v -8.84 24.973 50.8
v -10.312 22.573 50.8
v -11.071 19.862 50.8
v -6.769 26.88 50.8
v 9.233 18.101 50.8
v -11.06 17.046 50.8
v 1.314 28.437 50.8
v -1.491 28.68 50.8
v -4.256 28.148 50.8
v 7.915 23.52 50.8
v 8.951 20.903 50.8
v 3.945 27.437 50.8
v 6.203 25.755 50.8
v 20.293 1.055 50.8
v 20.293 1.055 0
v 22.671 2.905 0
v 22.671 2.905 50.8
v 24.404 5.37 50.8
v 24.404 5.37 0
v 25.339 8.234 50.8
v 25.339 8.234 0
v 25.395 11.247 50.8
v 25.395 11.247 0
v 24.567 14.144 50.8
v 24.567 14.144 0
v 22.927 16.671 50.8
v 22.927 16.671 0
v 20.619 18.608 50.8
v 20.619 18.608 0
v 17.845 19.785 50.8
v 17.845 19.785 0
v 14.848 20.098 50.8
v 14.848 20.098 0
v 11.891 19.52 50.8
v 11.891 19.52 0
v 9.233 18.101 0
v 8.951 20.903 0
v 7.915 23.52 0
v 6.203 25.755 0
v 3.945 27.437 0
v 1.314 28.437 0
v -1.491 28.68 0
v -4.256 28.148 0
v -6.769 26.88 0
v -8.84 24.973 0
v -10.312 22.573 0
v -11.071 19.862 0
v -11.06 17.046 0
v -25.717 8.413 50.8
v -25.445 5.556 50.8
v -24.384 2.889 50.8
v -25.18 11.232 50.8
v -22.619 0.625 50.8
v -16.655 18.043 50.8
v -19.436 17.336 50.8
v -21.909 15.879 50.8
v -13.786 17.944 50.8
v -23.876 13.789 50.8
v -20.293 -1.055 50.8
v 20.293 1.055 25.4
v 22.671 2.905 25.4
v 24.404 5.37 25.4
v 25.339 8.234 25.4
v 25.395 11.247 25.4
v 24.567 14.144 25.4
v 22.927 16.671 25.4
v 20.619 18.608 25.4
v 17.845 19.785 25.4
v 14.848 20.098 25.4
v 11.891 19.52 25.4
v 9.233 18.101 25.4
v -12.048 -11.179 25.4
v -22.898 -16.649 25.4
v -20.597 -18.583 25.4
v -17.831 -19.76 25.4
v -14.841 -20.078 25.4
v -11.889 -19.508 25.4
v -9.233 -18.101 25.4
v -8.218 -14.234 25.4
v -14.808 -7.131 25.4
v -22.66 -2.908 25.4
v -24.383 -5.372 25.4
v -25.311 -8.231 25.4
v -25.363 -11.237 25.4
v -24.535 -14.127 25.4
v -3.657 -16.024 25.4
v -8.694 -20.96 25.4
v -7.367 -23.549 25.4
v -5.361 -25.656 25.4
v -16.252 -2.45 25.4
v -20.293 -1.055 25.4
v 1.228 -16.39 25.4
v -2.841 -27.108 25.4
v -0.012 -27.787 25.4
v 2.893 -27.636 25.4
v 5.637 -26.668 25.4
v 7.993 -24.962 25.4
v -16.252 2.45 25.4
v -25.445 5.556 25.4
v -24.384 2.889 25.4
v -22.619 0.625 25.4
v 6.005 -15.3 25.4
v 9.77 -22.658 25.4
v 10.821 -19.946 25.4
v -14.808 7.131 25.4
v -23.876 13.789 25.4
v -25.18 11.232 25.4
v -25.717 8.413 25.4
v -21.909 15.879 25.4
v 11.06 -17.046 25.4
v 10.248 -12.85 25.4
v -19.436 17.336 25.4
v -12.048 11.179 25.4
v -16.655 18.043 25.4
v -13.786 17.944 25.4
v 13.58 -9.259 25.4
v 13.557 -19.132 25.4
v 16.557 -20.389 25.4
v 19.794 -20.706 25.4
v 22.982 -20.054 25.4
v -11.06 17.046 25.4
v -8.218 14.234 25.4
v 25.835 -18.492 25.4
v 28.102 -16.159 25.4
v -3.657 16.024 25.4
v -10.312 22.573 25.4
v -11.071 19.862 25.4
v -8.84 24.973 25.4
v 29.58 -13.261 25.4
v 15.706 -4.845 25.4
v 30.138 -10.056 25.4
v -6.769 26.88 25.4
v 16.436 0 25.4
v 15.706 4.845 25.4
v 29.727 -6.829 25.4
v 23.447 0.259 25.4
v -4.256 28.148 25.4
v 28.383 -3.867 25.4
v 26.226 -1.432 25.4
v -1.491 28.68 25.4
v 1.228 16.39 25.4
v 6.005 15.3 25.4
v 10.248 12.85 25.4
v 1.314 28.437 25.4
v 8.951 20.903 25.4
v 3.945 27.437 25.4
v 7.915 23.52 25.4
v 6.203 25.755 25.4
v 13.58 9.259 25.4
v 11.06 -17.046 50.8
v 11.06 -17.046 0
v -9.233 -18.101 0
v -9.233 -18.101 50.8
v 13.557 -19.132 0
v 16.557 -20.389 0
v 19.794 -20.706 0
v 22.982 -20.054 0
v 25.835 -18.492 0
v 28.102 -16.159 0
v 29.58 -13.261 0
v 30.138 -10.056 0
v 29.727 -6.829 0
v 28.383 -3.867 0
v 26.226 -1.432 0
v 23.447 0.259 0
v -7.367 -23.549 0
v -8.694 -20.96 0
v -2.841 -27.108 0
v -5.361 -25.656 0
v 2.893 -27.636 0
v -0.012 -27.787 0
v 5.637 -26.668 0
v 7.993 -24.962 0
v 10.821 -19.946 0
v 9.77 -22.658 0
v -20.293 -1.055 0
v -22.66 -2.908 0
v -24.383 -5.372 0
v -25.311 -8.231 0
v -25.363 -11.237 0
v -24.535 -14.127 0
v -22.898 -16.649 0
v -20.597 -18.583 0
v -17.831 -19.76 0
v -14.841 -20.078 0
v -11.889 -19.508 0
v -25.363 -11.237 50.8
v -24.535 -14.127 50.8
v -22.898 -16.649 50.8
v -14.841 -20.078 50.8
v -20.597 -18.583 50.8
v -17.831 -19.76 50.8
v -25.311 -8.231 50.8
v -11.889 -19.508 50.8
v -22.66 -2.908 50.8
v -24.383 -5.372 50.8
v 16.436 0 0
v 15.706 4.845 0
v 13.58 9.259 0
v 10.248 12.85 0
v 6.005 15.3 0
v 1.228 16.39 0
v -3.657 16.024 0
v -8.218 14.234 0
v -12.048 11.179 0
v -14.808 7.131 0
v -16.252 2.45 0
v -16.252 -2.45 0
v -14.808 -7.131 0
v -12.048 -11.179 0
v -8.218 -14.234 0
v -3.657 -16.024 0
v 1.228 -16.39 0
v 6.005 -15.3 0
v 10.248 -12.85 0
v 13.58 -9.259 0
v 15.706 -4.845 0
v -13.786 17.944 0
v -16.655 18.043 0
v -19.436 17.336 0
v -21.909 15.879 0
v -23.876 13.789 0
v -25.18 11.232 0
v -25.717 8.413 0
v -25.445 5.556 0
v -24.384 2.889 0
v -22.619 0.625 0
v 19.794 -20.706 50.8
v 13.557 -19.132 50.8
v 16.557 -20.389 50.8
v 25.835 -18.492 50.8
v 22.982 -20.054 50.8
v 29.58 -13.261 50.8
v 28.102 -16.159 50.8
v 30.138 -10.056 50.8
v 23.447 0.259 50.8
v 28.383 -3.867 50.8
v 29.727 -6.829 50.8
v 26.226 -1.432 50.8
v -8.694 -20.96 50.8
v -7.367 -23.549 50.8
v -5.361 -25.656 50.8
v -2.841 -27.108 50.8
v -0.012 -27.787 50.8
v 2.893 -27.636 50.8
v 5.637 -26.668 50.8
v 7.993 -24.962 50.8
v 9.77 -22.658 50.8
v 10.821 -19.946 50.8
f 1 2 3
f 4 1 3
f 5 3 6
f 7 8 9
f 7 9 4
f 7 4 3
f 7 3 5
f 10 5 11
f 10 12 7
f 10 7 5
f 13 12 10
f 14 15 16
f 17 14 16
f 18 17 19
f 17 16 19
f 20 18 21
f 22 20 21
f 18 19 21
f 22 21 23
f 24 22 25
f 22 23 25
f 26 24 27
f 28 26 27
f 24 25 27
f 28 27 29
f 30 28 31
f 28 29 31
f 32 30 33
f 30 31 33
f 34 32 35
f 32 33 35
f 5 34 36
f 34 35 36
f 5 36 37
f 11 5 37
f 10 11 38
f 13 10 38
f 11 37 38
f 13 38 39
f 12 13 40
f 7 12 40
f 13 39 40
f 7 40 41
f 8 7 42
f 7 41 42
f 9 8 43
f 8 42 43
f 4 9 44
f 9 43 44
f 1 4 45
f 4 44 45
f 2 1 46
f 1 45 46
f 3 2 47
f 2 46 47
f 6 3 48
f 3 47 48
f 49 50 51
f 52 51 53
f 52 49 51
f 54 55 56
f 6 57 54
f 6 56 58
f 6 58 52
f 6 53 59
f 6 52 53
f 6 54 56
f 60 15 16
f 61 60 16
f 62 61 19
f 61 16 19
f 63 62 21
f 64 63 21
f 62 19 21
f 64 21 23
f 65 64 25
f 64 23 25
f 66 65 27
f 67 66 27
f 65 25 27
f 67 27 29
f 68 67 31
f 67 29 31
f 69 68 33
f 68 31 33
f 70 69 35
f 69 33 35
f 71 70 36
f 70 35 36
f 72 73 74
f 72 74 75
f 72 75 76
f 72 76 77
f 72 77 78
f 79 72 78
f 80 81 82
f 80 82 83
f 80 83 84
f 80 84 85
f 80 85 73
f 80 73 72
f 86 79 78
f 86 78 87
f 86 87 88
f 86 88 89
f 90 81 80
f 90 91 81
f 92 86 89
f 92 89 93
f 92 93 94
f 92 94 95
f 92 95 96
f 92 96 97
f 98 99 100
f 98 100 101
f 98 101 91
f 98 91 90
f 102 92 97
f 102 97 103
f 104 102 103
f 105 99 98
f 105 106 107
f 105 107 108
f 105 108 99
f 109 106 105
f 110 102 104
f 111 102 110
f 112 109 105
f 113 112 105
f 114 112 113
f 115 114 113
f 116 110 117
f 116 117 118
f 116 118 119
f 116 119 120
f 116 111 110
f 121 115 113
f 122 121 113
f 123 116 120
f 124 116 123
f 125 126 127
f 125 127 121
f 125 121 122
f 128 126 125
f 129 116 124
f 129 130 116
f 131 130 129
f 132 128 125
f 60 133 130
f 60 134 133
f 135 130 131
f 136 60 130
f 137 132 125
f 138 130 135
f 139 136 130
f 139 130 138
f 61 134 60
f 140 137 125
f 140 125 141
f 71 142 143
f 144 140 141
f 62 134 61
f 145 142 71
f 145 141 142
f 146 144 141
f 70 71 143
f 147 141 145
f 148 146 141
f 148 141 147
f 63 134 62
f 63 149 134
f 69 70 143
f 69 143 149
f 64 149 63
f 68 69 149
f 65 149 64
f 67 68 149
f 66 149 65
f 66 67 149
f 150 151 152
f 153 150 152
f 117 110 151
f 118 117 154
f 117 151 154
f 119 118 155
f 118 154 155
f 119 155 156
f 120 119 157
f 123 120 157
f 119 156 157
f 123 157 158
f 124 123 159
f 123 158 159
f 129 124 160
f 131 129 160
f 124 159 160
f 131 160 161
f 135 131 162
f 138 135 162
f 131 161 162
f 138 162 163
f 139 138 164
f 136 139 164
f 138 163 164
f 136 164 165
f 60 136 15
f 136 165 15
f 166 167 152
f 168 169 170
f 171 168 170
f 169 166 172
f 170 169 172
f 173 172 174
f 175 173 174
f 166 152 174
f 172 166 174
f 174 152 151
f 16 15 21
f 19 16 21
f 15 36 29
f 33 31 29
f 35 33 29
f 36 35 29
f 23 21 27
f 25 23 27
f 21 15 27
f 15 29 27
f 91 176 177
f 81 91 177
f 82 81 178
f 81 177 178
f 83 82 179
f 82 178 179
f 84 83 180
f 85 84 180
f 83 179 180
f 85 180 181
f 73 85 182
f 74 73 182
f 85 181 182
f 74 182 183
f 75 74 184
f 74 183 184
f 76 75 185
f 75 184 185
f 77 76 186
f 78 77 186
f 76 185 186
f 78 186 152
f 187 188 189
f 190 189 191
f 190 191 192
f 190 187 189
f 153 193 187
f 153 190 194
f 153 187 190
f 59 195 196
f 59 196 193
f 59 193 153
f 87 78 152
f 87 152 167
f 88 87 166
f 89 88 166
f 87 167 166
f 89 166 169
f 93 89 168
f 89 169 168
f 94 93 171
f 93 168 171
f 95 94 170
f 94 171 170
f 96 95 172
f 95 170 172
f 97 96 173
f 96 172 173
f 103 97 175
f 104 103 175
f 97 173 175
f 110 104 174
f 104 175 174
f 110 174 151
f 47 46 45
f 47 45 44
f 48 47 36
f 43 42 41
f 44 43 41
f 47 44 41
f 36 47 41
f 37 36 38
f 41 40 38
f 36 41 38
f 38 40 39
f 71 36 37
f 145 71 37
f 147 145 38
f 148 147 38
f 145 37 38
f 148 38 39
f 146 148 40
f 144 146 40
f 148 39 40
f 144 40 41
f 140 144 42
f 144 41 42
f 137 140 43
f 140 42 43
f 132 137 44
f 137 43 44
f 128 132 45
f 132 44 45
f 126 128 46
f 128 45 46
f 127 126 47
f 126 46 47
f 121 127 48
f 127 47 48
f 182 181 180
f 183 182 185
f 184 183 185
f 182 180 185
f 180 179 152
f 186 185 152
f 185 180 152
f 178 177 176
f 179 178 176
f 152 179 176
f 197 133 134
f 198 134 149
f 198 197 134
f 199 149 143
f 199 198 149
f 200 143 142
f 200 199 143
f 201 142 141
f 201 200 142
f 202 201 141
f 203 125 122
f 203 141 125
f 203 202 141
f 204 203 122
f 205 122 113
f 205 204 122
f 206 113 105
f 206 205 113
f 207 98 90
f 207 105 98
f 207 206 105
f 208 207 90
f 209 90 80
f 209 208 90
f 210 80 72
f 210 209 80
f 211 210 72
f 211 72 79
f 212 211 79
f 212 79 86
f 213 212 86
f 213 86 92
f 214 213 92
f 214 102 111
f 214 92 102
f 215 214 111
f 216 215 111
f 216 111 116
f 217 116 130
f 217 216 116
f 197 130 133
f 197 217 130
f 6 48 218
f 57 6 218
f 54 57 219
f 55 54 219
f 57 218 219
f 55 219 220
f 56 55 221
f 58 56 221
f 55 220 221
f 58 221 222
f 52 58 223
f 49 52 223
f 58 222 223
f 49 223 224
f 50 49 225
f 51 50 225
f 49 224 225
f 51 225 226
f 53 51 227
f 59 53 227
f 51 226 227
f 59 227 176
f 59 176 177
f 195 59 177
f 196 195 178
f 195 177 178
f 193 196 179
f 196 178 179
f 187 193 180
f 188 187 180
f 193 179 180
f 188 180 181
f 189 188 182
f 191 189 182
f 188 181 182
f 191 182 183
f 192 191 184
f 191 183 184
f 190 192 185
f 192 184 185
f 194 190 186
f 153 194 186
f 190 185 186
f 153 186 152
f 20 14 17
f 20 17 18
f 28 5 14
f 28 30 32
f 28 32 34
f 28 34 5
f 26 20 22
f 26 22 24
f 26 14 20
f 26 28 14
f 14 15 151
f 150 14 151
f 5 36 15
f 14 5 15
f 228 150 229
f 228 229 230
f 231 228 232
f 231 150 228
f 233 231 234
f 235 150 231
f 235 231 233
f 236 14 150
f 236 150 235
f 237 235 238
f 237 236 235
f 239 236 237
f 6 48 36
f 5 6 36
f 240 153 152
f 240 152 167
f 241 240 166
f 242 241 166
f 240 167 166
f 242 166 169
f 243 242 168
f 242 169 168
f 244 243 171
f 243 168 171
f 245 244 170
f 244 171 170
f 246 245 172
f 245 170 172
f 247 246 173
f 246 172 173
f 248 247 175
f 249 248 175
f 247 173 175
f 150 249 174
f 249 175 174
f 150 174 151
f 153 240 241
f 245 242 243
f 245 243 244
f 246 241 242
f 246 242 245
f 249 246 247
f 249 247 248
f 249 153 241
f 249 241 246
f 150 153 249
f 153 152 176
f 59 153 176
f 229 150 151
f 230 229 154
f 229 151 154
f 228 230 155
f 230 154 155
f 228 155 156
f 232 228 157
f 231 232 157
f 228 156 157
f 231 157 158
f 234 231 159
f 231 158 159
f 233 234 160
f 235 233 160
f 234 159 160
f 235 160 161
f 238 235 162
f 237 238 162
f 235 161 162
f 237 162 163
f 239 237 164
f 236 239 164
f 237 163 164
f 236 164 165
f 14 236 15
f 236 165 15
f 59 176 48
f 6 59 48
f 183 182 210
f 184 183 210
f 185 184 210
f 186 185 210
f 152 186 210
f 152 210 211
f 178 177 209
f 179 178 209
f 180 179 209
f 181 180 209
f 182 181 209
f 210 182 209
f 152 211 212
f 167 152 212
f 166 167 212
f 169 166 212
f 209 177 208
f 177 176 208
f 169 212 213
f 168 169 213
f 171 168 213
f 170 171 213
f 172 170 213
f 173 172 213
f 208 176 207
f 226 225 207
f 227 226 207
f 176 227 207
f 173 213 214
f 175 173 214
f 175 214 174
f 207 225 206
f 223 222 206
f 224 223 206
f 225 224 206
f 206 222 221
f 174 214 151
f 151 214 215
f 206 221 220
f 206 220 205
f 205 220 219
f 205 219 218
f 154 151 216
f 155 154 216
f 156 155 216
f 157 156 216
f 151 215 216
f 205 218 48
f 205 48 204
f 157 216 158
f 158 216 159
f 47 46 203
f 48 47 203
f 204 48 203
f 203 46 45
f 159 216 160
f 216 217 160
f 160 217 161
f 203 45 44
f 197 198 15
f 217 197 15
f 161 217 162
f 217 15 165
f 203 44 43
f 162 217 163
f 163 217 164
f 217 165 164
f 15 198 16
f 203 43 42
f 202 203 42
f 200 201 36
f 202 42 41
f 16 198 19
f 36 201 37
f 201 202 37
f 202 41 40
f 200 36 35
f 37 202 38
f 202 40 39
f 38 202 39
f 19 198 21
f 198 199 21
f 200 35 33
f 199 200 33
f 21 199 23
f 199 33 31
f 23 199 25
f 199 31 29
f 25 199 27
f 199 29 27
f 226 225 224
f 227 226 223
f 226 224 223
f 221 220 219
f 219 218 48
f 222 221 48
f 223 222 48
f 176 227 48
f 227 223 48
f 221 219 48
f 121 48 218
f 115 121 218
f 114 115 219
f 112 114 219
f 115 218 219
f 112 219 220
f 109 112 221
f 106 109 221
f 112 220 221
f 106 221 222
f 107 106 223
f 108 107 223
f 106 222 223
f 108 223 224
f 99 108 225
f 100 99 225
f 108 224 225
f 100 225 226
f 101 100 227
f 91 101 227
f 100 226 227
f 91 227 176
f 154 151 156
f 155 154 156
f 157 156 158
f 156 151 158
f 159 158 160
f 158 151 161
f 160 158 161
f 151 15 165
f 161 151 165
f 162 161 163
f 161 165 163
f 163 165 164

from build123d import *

# Parameters (mm, degrees)
F1_DEPTH = 50.8
F2_DEPTH = 25.4
F3_R     = 16.4357396554
F4_DEPTH = 50.8


with BuildPart() as f1:
    # F0 (on Top) → F1 (new body)
    with BuildSketch(Plane.XY):
        with BuildLine():
            Line((-11.0600166182, 17.0463612659), (9.2325735892, 18.1014359905))
            ThreePointArc((9.2325735892, 18.1014359905), (-1.4911778045, 28.6803004619), (-11.0600166182, 17.0463612659))
        make_face()
    extrude(amount=F1_DEPTH)


with BuildPart() as f1b:
    # F0 (on Top) → F1, piece 2 (new body)
    with BuildSketch(Plane.XY):
        with BuildLine():
            Line((-20.2925902074, -1.0550747247), (-11.0600166182, 17.0463612659))
            ThreePointArc((-11.0600166182, 17.0463612659), (-24.6189313982, 12.5567991369), (-20.2925902074, -1.0550747247))
        make_face()
    extrude(amount=F1_DEPTH)


with BuildPart() as f1c:
    # F0 (on Top) → F1, piece 3 (new body)
    with BuildSketch(Plane.XY):
        with BuildLine():
            ThreePointArc((-20.2925902074, -1.0550747247), (-23.8102253538, -15.4485455276), (-9.2325735892, -18.1014359905))
            Line((-9.2325735892, -18.1014359905), (-20.2925902074, -1.0550747247))
        make_face()
    extrude(amount=F1_DEPTH)


with BuildPart() as f1d:
    # F0 (on Top) → F1, piece 4 (new body)
    with BuildSketch(Plane.XY):
        with BuildLine():
            ThreePointArc((-9.2325735892, -18.1014359905), (1.4462232878, -27.8156758392), (11.0600166182, -17.0463612659))
            Line((11.0600166182, -17.0463612659), (-9.2325735892, -18.1014359905))
        make_face()
    extrude(amount=F1_DEPTH)


with BuildPart() as f1e:
    # F0 (on Top) → F1, piece 5 (new body)
    with BuildSketch(Plane.XY):
        with BuildLine():
            ThreePointArc((11.0600166182, -17.0463612659), (28.9492244374, -14.76544983), (20.2925902074, 1.0550747247))
            Line((20.2925902074, 1.0550747247), (11.0600166182, -17.0463612659))
        make_face()
    extrude(amount=F1_DEPTH)


with BuildPart() as f1f:
    # F0 (on Top) → F1, piece 6 (new body)
    with BuildSketch(Plane.XY):
        with BuildLine():
            Line((9.2325735892, 18.1014359905), (20.2925902074, 1.0550747247))
            ThreePointArc((20.2925902074, 1.0550747247), (23.8409041786, 15.4684505564), (9.2325735892, 18.1014359905))
        make_face()
    extrude(amount=F1_DEPTH)


with BuildPart() as f2:
    # F0 (on Top) → F2 (new body)
    with BuildSketch(Plane.XY):
        with BuildLine():
            ThreePointArc((11.0600166182, -17.0463612659), (28.9492244374, -14.76544983), (20.2925902074, 1.0550747247))
            Line((20.2925902074, 1.0550747247), (11.0600166182, -17.0463612659))
        make_face()
        Polygon((11.0600166182, -17.0463612659), (20.2925902074, 1.0550747247), (9.2325735892, 18.1014359905), (-11.0600166182, 17.0463612659), (-20.2925902074, -1.0550747247), (-9.2325735892, -18.1014359905), align=None)
        with BuildLine():
            Line((9.2325735892, 18.1014359905), (20.2925902074, 1.0550747247))
            ThreePointArc((20.2925902074, 1.0550747247), (23.8409041786, 15.4684505564), (9.2325735892, 18.1014359905))
        make_face()
        with BuildLine():
            ThreePointArc((-9.2325735892, -18.1014359905), (1.4462232878, -27.8156758392), (11.0600166182, -17.0463612659))
            Line((11.0600166182, -17.0463612659), (-9.2325735892, -18.1014359905))
        make_face()
        with BuildLine():
            Line((-11.0600166182, 17.0463612659), (9.2325735892, 18.1014359905))
            ThreePointArc((9.2325735892, 18.1014359905), (-1.4911778045, 28.6803004619), (-11.0600166182, 17.0463612659))
        make_face()
        with BuildLine():
            ThreePointArc((-20.2925902074, -1.0550747247), (-23.8102253538, -15.4485455276), (-9.2325735892, -18.1014359905))
            Line((-9.2325735892, -18.1014359905), (-20.2925902074, -1.0550747247))
        make_face()
        with BuildLine():
            Line((-20.2925902074, -1.0550747247), (-11.0600166182, 17.0463612659))
            ThreePointArc((-11.0600166182, 17.0463612659), (-24.6189313982, 12.5567991369), (-20.2925902074, -1.0550747247))
        make_face()
    extrude(amount=F2_DEPTH)

    # F3 (on Top) → F4 (cut)
    with BuildSketch(Plane.XY):
        Circle(F3_R)
    extrude(amount=F4_DEPTH, mode=Mode.SUBTRACT)


solid = Compound([f1.part, f1b.part, f1c.part, f1d.part, f1e.part, f1f.part, f2.part])
